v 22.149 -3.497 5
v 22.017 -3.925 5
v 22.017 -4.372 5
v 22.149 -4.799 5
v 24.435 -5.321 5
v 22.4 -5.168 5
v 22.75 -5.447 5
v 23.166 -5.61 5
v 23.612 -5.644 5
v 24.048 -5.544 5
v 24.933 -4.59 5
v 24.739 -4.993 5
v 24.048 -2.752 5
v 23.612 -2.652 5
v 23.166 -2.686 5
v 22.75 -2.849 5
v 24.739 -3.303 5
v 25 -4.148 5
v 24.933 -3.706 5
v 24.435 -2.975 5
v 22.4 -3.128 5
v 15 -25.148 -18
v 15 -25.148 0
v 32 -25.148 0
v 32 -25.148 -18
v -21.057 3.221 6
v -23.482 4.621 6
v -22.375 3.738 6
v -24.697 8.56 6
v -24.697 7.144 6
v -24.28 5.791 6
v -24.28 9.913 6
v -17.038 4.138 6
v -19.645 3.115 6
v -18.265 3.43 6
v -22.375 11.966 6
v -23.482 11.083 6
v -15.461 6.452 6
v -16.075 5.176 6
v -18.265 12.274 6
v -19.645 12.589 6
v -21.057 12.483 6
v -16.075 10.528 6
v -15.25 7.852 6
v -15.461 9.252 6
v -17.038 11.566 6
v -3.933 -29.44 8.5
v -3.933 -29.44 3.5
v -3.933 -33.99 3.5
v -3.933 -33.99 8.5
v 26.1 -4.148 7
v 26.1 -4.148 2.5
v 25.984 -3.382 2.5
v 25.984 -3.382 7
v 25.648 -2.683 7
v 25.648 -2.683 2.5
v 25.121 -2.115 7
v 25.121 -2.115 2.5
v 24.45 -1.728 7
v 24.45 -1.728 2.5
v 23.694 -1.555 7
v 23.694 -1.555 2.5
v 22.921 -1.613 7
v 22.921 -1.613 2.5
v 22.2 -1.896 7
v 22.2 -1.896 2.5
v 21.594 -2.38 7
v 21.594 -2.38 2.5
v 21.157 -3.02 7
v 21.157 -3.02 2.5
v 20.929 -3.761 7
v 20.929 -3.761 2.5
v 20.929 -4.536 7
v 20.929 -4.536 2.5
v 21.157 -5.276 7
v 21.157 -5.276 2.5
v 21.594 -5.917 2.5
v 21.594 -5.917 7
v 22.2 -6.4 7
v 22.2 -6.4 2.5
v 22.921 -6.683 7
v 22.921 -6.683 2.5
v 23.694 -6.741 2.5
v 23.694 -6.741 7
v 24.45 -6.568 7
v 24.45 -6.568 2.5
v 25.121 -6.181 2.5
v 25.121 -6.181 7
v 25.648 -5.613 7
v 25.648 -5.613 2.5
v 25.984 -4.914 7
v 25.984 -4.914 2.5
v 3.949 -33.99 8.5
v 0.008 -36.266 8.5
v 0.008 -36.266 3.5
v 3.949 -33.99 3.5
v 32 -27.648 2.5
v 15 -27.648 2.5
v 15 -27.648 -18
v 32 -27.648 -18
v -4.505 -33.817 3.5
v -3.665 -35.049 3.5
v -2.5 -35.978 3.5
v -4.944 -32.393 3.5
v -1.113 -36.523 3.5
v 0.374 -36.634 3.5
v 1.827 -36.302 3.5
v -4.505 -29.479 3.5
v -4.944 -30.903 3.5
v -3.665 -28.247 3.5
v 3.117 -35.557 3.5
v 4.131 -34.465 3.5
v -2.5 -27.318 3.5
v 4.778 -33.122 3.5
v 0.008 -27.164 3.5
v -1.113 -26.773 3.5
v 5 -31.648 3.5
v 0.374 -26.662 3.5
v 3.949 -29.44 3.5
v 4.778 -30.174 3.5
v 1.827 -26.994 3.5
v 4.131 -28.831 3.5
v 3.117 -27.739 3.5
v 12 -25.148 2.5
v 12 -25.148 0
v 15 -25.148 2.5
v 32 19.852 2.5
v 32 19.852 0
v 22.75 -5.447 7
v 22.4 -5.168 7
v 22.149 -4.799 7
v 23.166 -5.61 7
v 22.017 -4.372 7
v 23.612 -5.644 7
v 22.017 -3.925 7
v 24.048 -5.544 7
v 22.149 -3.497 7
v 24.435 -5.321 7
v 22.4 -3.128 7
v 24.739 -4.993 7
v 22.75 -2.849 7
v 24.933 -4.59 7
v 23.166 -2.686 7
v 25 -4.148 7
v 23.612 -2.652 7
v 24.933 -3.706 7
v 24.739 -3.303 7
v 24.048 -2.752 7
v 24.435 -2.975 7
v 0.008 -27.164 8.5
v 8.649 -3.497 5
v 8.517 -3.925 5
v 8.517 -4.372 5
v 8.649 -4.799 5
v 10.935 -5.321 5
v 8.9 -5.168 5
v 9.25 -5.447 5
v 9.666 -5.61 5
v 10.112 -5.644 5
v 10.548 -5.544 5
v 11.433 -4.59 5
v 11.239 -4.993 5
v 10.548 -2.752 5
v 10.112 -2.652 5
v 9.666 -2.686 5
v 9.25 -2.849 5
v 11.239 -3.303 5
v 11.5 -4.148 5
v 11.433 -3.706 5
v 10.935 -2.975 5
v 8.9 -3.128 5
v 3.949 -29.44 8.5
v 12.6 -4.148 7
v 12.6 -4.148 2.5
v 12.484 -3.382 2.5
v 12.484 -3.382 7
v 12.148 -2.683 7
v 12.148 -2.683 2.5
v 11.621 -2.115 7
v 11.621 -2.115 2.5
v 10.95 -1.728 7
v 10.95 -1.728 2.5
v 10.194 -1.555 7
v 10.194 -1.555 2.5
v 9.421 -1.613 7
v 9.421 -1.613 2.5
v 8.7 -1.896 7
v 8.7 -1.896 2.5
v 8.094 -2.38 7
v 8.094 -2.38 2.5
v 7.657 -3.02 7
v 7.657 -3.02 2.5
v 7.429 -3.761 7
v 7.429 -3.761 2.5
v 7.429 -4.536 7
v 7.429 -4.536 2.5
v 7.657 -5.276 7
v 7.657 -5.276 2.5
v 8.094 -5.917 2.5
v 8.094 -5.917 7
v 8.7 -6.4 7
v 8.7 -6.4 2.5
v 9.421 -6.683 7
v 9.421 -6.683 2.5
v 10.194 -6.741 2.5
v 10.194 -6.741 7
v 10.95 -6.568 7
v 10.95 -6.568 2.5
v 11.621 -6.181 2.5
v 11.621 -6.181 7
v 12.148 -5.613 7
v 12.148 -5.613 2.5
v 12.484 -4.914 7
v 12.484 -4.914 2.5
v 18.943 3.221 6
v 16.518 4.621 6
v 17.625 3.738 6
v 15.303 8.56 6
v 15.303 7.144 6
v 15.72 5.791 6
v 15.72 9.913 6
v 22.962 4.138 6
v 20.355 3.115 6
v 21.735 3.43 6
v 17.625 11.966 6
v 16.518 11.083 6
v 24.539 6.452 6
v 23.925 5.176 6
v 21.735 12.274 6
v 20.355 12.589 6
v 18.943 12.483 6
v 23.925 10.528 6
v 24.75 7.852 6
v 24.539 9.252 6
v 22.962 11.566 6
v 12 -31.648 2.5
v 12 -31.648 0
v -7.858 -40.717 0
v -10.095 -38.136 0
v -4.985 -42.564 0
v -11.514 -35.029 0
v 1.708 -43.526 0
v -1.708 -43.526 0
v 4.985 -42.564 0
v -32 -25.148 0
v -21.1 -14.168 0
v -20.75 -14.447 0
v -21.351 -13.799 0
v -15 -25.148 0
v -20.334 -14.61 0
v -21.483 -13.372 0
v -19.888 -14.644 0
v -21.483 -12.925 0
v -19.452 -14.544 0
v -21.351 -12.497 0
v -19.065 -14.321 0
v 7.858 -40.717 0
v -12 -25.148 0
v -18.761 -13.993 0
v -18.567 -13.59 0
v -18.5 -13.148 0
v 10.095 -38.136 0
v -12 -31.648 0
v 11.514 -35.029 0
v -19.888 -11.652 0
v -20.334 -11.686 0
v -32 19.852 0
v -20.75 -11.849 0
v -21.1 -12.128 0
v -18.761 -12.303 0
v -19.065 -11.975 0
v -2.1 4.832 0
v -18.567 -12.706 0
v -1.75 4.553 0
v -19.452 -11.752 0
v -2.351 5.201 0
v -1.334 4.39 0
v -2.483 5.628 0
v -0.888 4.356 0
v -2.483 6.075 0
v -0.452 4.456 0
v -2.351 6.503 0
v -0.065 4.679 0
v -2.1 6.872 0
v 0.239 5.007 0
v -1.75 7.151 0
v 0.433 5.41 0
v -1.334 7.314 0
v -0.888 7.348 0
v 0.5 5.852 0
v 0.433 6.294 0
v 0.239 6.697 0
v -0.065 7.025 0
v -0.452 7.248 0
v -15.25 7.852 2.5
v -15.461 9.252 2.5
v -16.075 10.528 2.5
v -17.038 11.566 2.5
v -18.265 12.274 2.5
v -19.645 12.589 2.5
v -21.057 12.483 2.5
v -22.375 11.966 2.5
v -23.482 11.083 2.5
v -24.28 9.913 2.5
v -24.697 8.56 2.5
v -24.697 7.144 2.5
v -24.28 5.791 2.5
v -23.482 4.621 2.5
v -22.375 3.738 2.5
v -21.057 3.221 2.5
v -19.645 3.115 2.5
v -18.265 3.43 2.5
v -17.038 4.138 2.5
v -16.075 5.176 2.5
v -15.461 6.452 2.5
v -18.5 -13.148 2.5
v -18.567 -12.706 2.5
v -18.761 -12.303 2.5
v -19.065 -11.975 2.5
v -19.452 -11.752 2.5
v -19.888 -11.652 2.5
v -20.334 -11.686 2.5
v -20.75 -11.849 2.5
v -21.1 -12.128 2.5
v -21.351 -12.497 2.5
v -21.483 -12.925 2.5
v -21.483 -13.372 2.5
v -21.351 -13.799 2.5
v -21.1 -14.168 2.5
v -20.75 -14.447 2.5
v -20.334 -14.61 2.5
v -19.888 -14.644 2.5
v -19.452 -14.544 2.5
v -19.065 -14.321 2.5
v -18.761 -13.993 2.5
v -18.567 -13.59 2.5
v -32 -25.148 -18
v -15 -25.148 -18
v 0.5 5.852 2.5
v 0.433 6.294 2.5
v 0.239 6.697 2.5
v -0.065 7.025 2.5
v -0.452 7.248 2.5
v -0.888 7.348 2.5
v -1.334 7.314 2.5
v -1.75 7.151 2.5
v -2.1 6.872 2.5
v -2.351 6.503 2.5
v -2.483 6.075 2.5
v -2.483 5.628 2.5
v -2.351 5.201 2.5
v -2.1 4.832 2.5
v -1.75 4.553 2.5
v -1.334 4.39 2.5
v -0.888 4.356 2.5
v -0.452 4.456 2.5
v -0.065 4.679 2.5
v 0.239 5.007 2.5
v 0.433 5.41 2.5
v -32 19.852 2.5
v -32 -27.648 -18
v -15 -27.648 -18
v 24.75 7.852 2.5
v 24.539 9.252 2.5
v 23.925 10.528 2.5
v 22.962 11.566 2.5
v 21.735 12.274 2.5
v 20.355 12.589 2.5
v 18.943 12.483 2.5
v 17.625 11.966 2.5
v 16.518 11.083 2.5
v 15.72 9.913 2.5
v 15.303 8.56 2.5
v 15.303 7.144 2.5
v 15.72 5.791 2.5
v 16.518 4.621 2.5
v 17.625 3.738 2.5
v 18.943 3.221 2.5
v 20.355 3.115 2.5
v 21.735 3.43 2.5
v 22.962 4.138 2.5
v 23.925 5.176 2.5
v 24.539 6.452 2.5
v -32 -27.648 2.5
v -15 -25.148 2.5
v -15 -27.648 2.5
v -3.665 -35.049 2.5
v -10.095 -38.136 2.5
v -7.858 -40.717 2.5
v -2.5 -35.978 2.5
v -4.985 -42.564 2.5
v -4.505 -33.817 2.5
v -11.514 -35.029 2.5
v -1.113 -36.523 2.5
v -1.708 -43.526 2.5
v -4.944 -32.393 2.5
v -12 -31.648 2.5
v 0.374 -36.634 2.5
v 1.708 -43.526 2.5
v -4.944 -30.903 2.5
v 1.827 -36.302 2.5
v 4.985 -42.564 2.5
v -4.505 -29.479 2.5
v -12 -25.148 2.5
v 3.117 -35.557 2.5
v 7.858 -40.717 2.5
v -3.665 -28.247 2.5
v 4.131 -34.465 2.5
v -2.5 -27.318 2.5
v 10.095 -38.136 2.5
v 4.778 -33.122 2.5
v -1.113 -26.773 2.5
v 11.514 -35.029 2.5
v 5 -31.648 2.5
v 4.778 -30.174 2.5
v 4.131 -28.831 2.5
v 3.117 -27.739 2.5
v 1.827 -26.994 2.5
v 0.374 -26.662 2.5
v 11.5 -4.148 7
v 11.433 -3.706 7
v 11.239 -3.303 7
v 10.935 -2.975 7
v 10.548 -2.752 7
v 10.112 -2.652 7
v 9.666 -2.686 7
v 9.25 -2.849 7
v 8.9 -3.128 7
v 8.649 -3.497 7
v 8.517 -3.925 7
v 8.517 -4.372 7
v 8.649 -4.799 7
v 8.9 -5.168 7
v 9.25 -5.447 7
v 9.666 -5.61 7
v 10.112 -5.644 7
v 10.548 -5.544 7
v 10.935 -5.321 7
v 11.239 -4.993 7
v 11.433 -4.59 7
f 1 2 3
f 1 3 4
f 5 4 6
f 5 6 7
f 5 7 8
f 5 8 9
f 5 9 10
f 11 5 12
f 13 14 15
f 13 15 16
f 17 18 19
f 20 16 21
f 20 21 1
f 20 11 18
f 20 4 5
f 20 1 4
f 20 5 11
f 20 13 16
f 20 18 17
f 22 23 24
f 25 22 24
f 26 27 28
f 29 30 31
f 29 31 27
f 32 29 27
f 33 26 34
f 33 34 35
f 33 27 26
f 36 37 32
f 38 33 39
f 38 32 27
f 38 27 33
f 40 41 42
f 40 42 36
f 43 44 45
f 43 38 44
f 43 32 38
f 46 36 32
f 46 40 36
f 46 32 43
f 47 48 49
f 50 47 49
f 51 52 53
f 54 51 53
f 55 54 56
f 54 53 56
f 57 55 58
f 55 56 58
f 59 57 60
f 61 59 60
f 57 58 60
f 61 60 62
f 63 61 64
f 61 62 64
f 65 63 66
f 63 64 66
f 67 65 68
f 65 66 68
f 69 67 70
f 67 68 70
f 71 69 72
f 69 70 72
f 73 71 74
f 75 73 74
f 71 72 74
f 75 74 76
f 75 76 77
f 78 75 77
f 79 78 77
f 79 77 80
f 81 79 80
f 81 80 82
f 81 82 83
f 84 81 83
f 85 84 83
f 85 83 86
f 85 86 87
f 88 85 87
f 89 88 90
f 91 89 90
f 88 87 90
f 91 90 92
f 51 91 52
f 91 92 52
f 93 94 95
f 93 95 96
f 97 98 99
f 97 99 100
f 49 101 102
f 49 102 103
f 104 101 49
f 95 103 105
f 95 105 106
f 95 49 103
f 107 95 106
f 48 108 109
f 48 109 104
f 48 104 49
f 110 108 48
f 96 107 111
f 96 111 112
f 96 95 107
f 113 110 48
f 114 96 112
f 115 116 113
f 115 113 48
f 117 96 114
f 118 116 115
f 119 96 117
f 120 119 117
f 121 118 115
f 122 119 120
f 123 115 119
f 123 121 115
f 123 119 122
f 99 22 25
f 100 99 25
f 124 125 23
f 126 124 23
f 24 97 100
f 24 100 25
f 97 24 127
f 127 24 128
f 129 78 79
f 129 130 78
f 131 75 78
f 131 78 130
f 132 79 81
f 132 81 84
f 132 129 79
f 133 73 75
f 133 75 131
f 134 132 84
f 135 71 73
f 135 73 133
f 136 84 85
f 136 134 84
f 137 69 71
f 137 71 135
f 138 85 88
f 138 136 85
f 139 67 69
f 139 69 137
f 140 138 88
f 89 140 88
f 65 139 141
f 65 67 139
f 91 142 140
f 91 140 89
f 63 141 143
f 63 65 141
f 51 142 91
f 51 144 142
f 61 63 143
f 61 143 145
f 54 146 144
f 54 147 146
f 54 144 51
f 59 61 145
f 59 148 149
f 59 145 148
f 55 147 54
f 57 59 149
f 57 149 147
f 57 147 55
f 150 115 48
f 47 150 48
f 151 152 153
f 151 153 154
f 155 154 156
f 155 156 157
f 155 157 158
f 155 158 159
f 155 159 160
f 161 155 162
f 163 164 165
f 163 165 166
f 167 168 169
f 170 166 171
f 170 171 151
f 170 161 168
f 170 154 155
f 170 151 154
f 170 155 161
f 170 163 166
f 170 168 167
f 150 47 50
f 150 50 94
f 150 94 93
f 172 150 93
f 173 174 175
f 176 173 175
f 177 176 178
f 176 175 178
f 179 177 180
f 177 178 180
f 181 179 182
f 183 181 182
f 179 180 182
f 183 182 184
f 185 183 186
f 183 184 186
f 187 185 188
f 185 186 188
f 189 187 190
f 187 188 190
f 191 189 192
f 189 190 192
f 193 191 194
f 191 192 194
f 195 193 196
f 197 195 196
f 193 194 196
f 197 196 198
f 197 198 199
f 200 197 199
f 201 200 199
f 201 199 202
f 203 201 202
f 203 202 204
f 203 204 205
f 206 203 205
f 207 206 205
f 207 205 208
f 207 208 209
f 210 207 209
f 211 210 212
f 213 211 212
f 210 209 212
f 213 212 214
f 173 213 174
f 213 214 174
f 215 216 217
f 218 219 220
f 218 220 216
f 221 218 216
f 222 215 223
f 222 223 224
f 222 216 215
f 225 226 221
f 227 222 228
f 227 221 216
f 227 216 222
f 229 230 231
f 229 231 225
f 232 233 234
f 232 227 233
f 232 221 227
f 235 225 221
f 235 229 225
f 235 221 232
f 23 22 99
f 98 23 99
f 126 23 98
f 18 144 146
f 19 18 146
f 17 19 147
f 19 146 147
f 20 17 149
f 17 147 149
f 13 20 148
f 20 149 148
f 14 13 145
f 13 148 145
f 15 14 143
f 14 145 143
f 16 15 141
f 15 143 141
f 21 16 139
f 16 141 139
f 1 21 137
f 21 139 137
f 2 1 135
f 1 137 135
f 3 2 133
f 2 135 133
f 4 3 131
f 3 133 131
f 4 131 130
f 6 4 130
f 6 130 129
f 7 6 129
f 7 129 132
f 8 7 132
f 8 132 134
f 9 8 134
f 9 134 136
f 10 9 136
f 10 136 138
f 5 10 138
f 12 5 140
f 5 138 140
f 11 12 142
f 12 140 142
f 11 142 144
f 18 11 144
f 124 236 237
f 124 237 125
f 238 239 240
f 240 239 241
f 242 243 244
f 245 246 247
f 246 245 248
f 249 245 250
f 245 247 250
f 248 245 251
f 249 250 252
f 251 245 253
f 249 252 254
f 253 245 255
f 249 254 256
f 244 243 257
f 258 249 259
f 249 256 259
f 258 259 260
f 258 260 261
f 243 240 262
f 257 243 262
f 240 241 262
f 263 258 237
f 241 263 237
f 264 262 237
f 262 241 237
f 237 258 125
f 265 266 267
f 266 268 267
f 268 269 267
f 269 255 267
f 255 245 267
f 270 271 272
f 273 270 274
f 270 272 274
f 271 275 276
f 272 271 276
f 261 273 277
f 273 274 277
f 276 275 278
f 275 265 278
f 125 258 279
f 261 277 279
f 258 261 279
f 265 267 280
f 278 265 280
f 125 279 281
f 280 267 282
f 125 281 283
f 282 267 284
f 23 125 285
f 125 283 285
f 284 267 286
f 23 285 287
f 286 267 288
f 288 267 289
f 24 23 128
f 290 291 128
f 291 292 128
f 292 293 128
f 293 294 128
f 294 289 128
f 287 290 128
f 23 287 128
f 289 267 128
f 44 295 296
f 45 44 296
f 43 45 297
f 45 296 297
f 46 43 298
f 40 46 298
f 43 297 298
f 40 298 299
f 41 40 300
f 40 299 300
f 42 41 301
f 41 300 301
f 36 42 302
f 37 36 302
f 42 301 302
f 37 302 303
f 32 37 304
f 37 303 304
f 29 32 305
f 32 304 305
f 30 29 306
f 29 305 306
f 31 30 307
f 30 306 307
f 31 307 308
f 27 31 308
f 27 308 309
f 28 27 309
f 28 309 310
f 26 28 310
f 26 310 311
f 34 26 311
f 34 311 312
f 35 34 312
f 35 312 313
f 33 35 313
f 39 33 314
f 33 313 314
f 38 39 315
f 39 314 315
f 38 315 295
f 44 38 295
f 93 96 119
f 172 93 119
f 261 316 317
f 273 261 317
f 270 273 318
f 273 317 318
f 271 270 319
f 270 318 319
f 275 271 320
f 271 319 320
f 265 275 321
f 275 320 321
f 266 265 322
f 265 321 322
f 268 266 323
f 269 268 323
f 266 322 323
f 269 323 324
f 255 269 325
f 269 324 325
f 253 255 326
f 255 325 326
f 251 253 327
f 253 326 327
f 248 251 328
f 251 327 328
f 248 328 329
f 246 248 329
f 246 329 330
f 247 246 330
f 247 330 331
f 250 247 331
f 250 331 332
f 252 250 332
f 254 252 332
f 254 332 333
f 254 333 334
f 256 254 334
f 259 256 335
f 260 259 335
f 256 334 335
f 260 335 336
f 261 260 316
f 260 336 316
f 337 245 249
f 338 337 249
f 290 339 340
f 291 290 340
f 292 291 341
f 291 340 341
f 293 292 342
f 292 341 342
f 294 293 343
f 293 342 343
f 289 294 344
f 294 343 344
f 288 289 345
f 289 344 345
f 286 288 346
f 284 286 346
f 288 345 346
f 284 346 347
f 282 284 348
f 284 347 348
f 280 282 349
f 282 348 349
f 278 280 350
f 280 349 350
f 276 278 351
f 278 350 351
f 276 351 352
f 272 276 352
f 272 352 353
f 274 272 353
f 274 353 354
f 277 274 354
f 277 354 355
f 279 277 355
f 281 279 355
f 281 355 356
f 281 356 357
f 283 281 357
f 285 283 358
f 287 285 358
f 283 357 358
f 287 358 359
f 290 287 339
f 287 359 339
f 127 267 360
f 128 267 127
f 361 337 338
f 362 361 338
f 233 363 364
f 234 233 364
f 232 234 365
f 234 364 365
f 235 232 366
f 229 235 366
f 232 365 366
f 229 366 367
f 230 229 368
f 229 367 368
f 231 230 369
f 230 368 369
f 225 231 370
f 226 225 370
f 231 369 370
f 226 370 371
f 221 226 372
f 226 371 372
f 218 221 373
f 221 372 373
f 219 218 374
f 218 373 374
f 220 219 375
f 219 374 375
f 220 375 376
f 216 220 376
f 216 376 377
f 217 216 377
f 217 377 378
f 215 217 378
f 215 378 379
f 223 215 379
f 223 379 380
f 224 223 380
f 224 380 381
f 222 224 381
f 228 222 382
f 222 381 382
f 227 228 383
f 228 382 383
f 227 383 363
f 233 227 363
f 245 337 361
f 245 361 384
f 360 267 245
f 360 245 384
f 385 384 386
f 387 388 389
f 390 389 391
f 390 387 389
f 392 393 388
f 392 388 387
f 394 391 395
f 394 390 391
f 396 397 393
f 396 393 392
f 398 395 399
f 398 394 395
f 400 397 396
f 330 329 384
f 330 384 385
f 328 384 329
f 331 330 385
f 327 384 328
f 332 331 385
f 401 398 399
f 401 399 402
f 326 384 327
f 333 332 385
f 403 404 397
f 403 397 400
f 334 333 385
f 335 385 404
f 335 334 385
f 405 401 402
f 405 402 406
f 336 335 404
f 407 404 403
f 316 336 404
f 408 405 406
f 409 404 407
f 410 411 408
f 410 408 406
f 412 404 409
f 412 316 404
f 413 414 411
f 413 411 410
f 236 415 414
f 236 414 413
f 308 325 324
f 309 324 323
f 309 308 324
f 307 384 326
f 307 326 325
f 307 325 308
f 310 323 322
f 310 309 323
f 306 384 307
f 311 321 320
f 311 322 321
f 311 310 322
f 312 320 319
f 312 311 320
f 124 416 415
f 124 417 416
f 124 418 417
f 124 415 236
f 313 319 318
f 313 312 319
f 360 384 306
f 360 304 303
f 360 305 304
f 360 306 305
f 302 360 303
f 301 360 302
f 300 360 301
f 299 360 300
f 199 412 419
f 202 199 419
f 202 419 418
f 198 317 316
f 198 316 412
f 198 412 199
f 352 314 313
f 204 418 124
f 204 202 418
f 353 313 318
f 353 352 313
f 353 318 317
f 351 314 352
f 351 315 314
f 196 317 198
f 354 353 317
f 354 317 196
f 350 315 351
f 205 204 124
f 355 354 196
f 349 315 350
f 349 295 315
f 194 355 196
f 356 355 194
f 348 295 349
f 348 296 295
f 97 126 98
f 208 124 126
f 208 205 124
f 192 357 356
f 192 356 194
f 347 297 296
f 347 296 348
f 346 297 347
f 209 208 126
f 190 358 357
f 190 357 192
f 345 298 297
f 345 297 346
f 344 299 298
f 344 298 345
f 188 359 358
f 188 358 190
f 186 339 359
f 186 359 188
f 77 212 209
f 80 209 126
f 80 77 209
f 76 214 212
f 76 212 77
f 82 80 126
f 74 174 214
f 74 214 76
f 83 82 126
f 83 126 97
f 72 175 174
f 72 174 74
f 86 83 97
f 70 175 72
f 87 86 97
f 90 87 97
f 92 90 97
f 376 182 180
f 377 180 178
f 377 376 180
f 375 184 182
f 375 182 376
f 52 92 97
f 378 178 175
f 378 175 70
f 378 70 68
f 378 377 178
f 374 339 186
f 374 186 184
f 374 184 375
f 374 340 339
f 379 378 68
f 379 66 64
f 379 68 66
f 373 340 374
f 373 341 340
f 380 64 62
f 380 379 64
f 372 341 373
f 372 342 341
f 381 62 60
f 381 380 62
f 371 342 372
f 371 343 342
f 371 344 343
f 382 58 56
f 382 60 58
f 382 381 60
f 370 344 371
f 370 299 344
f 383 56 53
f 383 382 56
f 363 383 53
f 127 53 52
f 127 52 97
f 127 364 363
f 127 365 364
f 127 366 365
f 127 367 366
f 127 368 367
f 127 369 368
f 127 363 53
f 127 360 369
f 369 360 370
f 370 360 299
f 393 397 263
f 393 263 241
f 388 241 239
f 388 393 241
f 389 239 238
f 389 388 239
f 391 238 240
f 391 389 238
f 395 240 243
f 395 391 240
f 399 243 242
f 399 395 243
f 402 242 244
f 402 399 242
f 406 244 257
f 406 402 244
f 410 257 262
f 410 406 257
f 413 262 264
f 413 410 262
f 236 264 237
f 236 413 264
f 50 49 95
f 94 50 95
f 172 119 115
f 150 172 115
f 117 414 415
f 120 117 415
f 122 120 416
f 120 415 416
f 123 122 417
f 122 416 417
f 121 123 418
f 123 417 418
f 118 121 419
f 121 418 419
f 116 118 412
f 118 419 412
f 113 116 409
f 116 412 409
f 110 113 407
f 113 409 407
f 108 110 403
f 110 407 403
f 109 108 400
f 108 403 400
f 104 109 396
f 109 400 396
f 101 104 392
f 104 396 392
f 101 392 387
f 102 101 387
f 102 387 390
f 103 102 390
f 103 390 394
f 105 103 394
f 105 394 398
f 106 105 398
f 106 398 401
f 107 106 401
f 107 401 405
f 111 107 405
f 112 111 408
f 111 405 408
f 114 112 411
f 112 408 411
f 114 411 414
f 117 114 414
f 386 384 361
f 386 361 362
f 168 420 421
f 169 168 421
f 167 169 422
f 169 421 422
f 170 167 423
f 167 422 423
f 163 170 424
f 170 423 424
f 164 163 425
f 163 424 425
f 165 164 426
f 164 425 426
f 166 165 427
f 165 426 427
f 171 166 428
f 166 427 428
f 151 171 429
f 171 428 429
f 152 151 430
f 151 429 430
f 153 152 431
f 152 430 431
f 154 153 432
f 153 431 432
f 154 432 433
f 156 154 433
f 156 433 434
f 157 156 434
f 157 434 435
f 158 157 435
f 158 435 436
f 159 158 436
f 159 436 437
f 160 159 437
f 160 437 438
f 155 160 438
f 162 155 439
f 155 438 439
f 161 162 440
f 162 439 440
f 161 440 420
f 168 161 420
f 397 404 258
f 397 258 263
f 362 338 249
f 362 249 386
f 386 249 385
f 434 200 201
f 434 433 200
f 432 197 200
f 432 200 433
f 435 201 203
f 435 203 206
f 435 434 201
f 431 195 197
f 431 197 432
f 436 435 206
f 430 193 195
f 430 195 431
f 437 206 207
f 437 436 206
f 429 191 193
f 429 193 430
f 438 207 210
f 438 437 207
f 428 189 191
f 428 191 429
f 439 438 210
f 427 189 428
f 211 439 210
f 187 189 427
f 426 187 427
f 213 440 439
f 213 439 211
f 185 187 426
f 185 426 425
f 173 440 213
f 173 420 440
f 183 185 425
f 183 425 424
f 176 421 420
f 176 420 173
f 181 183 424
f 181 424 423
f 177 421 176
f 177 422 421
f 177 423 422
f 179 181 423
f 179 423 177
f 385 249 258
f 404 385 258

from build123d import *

# Parameters (mm, degrees)
SKETCH1_W           = 64
SKETCH1_H           = 45
BOSS_EXTRUDE1_DEPTH = 2.5
SKETCH3_W           = 17
SKETCH3_H           = 20.5
BOSS_EXTRUDE2_DEPTH = 2.5
BOSS_EXTRUDE4_DEPTH = 2.5
SKETCH6_R           = 5
BOSS_EXTRUDE5_DEPTH = 1
BOSS_EXTRUDE6_DEPTH = 5
SKETCH8_R           = 1.5
CUT_EXTRUDE1_DEPTH  = 2.5
SKETCH9_R           = 4.75
BOSS_EXTRUDE7_DEPTH = 3.5
SKETCH10_R          = 2.6
BOSS_EXTRUDE8_DEPTH = 4.5
SKETCH11_R          = 1.5
CUT_EXTRUDE2_DEPTH  = 2
SKETCH12_R          = 1.5
CUT_EXTRUDE3_DEPTH  = 2


with BuildPart() as part:
    # Sketch1 → Boss-Extrude1 (new body)
    with BuildSketch(Plane.XY):
        with Locations((0, -2.648063781)):
            Rectangle(SKETCH1_W, SKETCH1_H)
    extrude(amount=BOSS_EXTRUDE1_DEPTH)

    # Sketch3 → Boss-Extrude2 (add)
    with BuildSketch(Plane.XZ.offset(25.148063781)):
        with Locations((-23.5, -7.75)):
            Rectangle(SKETCH3_W, SKETCH3_H)
        with Locations((23.5, -7.75)):
            Rectangle(SKETCH3_W, SKETCH3_H)
    extrude(amount=BOSS_EXTRUDE2_DEPTH)

    # Sketch5 → Boss-Extrude4 (add)
    with BuildSketch(Plane.XY.offset(2.5)):
        with BuildLine():
            Line((-12, -25.148063781), (-12, -31.648063781))
            ThreePointArc((-12, -31.648063781), (0, -43.648063781), (12, -31.648063781))
            Line((12, -31.648063781), (12, -25.148063781))
            Line((12, -25.148063781), (-12, -25.148063781))
        make_face()
    extrude(amount=-BOSS_EXTRUDE4_DEPTH)

    # Sketch6 → Boss-Extrude5 (add)
    with BuildSketch(Plane.XY.offset(2.5)):
        with Locations((0, -31.648063781)):
            Circle(SKETCH6_R)
    extrude(amount=BOSS_EXTRUDE5_DEPTH)

    # Sketch7 → Boss-Extrude6 (add)
    with BuildSketch(Plane.XY.offset(3.5)):
        Polygon((0.007672283, -27.164333449), (-3.933372225, -29.439696556), (-3.933372225, -33.990422772), (0.007672283, -36.26578588), (3.948716792, -33.990422772), (3.948716792, -29.439696556), align=None)
    extrude(amount=BOSS_EXTRUDE6_DEPTH)

    # Sketch8 → Cut-Extrude1 (cut)
    with BuildSketch(Plane.XY.offset(2.5)):
        with Locations((-20, -13.148063781)):
            Circle(SKETCH8_R)
        with Locations((-1, 5.851936219)):
            Circle(SKETCH8_R)
    extrude(amount=-CUT_EXTRUDE1_DEPTH, mode=Mode.SUBTRACT)

    # Sketch9 → Boss-Extrude7 (add)
    with BuildSketch(Plane.XY.offset(2.5)):
        with Locations((-20, 7.851936219)):
            Circle(SKETCH9_R)
        with Locations((20, 7.851936219)):
            Circle(SKETCH9_R)
    extrude(amount=BOSS_EXTRUDE7_DEPTH)

    # Sketch10 → Boss-Extrude8 (add)
    with BuildSketch(Plane.XY.offset(2.5)):
        with Locations((10, -4.148063781)):
            Circle(SKETCH10_R)
        with Locations((23.5, -4.148063781)):
            Circle(SKETCH10_R)
    extrude(amount=BOSS_EXTRUDE8_DEPTH)

    # Sketch11 → Cut-Extrude2 (cut)
    with BuildSketch(Plane.XY.offset(7)):
        with Locations((10, -4.148063781)):
            Circle(SKETCH11_R)
    extrude(amount=-CUT_EXTRUDE2_DEPTH, mode=Mode.SUBTRACT)

    # Sketch12 → Cut-Extrude3 (cut)
    with BuildSketch(Plane.XY.offset(7)):
        with Locations((23.5, -4.148063781)):
            Circle(SKETCH12_R)
    extrude(amount=-CUT_EXTRUDE3_DEPTH, mode=Mode.SUBTRACT)


solid = part.part
